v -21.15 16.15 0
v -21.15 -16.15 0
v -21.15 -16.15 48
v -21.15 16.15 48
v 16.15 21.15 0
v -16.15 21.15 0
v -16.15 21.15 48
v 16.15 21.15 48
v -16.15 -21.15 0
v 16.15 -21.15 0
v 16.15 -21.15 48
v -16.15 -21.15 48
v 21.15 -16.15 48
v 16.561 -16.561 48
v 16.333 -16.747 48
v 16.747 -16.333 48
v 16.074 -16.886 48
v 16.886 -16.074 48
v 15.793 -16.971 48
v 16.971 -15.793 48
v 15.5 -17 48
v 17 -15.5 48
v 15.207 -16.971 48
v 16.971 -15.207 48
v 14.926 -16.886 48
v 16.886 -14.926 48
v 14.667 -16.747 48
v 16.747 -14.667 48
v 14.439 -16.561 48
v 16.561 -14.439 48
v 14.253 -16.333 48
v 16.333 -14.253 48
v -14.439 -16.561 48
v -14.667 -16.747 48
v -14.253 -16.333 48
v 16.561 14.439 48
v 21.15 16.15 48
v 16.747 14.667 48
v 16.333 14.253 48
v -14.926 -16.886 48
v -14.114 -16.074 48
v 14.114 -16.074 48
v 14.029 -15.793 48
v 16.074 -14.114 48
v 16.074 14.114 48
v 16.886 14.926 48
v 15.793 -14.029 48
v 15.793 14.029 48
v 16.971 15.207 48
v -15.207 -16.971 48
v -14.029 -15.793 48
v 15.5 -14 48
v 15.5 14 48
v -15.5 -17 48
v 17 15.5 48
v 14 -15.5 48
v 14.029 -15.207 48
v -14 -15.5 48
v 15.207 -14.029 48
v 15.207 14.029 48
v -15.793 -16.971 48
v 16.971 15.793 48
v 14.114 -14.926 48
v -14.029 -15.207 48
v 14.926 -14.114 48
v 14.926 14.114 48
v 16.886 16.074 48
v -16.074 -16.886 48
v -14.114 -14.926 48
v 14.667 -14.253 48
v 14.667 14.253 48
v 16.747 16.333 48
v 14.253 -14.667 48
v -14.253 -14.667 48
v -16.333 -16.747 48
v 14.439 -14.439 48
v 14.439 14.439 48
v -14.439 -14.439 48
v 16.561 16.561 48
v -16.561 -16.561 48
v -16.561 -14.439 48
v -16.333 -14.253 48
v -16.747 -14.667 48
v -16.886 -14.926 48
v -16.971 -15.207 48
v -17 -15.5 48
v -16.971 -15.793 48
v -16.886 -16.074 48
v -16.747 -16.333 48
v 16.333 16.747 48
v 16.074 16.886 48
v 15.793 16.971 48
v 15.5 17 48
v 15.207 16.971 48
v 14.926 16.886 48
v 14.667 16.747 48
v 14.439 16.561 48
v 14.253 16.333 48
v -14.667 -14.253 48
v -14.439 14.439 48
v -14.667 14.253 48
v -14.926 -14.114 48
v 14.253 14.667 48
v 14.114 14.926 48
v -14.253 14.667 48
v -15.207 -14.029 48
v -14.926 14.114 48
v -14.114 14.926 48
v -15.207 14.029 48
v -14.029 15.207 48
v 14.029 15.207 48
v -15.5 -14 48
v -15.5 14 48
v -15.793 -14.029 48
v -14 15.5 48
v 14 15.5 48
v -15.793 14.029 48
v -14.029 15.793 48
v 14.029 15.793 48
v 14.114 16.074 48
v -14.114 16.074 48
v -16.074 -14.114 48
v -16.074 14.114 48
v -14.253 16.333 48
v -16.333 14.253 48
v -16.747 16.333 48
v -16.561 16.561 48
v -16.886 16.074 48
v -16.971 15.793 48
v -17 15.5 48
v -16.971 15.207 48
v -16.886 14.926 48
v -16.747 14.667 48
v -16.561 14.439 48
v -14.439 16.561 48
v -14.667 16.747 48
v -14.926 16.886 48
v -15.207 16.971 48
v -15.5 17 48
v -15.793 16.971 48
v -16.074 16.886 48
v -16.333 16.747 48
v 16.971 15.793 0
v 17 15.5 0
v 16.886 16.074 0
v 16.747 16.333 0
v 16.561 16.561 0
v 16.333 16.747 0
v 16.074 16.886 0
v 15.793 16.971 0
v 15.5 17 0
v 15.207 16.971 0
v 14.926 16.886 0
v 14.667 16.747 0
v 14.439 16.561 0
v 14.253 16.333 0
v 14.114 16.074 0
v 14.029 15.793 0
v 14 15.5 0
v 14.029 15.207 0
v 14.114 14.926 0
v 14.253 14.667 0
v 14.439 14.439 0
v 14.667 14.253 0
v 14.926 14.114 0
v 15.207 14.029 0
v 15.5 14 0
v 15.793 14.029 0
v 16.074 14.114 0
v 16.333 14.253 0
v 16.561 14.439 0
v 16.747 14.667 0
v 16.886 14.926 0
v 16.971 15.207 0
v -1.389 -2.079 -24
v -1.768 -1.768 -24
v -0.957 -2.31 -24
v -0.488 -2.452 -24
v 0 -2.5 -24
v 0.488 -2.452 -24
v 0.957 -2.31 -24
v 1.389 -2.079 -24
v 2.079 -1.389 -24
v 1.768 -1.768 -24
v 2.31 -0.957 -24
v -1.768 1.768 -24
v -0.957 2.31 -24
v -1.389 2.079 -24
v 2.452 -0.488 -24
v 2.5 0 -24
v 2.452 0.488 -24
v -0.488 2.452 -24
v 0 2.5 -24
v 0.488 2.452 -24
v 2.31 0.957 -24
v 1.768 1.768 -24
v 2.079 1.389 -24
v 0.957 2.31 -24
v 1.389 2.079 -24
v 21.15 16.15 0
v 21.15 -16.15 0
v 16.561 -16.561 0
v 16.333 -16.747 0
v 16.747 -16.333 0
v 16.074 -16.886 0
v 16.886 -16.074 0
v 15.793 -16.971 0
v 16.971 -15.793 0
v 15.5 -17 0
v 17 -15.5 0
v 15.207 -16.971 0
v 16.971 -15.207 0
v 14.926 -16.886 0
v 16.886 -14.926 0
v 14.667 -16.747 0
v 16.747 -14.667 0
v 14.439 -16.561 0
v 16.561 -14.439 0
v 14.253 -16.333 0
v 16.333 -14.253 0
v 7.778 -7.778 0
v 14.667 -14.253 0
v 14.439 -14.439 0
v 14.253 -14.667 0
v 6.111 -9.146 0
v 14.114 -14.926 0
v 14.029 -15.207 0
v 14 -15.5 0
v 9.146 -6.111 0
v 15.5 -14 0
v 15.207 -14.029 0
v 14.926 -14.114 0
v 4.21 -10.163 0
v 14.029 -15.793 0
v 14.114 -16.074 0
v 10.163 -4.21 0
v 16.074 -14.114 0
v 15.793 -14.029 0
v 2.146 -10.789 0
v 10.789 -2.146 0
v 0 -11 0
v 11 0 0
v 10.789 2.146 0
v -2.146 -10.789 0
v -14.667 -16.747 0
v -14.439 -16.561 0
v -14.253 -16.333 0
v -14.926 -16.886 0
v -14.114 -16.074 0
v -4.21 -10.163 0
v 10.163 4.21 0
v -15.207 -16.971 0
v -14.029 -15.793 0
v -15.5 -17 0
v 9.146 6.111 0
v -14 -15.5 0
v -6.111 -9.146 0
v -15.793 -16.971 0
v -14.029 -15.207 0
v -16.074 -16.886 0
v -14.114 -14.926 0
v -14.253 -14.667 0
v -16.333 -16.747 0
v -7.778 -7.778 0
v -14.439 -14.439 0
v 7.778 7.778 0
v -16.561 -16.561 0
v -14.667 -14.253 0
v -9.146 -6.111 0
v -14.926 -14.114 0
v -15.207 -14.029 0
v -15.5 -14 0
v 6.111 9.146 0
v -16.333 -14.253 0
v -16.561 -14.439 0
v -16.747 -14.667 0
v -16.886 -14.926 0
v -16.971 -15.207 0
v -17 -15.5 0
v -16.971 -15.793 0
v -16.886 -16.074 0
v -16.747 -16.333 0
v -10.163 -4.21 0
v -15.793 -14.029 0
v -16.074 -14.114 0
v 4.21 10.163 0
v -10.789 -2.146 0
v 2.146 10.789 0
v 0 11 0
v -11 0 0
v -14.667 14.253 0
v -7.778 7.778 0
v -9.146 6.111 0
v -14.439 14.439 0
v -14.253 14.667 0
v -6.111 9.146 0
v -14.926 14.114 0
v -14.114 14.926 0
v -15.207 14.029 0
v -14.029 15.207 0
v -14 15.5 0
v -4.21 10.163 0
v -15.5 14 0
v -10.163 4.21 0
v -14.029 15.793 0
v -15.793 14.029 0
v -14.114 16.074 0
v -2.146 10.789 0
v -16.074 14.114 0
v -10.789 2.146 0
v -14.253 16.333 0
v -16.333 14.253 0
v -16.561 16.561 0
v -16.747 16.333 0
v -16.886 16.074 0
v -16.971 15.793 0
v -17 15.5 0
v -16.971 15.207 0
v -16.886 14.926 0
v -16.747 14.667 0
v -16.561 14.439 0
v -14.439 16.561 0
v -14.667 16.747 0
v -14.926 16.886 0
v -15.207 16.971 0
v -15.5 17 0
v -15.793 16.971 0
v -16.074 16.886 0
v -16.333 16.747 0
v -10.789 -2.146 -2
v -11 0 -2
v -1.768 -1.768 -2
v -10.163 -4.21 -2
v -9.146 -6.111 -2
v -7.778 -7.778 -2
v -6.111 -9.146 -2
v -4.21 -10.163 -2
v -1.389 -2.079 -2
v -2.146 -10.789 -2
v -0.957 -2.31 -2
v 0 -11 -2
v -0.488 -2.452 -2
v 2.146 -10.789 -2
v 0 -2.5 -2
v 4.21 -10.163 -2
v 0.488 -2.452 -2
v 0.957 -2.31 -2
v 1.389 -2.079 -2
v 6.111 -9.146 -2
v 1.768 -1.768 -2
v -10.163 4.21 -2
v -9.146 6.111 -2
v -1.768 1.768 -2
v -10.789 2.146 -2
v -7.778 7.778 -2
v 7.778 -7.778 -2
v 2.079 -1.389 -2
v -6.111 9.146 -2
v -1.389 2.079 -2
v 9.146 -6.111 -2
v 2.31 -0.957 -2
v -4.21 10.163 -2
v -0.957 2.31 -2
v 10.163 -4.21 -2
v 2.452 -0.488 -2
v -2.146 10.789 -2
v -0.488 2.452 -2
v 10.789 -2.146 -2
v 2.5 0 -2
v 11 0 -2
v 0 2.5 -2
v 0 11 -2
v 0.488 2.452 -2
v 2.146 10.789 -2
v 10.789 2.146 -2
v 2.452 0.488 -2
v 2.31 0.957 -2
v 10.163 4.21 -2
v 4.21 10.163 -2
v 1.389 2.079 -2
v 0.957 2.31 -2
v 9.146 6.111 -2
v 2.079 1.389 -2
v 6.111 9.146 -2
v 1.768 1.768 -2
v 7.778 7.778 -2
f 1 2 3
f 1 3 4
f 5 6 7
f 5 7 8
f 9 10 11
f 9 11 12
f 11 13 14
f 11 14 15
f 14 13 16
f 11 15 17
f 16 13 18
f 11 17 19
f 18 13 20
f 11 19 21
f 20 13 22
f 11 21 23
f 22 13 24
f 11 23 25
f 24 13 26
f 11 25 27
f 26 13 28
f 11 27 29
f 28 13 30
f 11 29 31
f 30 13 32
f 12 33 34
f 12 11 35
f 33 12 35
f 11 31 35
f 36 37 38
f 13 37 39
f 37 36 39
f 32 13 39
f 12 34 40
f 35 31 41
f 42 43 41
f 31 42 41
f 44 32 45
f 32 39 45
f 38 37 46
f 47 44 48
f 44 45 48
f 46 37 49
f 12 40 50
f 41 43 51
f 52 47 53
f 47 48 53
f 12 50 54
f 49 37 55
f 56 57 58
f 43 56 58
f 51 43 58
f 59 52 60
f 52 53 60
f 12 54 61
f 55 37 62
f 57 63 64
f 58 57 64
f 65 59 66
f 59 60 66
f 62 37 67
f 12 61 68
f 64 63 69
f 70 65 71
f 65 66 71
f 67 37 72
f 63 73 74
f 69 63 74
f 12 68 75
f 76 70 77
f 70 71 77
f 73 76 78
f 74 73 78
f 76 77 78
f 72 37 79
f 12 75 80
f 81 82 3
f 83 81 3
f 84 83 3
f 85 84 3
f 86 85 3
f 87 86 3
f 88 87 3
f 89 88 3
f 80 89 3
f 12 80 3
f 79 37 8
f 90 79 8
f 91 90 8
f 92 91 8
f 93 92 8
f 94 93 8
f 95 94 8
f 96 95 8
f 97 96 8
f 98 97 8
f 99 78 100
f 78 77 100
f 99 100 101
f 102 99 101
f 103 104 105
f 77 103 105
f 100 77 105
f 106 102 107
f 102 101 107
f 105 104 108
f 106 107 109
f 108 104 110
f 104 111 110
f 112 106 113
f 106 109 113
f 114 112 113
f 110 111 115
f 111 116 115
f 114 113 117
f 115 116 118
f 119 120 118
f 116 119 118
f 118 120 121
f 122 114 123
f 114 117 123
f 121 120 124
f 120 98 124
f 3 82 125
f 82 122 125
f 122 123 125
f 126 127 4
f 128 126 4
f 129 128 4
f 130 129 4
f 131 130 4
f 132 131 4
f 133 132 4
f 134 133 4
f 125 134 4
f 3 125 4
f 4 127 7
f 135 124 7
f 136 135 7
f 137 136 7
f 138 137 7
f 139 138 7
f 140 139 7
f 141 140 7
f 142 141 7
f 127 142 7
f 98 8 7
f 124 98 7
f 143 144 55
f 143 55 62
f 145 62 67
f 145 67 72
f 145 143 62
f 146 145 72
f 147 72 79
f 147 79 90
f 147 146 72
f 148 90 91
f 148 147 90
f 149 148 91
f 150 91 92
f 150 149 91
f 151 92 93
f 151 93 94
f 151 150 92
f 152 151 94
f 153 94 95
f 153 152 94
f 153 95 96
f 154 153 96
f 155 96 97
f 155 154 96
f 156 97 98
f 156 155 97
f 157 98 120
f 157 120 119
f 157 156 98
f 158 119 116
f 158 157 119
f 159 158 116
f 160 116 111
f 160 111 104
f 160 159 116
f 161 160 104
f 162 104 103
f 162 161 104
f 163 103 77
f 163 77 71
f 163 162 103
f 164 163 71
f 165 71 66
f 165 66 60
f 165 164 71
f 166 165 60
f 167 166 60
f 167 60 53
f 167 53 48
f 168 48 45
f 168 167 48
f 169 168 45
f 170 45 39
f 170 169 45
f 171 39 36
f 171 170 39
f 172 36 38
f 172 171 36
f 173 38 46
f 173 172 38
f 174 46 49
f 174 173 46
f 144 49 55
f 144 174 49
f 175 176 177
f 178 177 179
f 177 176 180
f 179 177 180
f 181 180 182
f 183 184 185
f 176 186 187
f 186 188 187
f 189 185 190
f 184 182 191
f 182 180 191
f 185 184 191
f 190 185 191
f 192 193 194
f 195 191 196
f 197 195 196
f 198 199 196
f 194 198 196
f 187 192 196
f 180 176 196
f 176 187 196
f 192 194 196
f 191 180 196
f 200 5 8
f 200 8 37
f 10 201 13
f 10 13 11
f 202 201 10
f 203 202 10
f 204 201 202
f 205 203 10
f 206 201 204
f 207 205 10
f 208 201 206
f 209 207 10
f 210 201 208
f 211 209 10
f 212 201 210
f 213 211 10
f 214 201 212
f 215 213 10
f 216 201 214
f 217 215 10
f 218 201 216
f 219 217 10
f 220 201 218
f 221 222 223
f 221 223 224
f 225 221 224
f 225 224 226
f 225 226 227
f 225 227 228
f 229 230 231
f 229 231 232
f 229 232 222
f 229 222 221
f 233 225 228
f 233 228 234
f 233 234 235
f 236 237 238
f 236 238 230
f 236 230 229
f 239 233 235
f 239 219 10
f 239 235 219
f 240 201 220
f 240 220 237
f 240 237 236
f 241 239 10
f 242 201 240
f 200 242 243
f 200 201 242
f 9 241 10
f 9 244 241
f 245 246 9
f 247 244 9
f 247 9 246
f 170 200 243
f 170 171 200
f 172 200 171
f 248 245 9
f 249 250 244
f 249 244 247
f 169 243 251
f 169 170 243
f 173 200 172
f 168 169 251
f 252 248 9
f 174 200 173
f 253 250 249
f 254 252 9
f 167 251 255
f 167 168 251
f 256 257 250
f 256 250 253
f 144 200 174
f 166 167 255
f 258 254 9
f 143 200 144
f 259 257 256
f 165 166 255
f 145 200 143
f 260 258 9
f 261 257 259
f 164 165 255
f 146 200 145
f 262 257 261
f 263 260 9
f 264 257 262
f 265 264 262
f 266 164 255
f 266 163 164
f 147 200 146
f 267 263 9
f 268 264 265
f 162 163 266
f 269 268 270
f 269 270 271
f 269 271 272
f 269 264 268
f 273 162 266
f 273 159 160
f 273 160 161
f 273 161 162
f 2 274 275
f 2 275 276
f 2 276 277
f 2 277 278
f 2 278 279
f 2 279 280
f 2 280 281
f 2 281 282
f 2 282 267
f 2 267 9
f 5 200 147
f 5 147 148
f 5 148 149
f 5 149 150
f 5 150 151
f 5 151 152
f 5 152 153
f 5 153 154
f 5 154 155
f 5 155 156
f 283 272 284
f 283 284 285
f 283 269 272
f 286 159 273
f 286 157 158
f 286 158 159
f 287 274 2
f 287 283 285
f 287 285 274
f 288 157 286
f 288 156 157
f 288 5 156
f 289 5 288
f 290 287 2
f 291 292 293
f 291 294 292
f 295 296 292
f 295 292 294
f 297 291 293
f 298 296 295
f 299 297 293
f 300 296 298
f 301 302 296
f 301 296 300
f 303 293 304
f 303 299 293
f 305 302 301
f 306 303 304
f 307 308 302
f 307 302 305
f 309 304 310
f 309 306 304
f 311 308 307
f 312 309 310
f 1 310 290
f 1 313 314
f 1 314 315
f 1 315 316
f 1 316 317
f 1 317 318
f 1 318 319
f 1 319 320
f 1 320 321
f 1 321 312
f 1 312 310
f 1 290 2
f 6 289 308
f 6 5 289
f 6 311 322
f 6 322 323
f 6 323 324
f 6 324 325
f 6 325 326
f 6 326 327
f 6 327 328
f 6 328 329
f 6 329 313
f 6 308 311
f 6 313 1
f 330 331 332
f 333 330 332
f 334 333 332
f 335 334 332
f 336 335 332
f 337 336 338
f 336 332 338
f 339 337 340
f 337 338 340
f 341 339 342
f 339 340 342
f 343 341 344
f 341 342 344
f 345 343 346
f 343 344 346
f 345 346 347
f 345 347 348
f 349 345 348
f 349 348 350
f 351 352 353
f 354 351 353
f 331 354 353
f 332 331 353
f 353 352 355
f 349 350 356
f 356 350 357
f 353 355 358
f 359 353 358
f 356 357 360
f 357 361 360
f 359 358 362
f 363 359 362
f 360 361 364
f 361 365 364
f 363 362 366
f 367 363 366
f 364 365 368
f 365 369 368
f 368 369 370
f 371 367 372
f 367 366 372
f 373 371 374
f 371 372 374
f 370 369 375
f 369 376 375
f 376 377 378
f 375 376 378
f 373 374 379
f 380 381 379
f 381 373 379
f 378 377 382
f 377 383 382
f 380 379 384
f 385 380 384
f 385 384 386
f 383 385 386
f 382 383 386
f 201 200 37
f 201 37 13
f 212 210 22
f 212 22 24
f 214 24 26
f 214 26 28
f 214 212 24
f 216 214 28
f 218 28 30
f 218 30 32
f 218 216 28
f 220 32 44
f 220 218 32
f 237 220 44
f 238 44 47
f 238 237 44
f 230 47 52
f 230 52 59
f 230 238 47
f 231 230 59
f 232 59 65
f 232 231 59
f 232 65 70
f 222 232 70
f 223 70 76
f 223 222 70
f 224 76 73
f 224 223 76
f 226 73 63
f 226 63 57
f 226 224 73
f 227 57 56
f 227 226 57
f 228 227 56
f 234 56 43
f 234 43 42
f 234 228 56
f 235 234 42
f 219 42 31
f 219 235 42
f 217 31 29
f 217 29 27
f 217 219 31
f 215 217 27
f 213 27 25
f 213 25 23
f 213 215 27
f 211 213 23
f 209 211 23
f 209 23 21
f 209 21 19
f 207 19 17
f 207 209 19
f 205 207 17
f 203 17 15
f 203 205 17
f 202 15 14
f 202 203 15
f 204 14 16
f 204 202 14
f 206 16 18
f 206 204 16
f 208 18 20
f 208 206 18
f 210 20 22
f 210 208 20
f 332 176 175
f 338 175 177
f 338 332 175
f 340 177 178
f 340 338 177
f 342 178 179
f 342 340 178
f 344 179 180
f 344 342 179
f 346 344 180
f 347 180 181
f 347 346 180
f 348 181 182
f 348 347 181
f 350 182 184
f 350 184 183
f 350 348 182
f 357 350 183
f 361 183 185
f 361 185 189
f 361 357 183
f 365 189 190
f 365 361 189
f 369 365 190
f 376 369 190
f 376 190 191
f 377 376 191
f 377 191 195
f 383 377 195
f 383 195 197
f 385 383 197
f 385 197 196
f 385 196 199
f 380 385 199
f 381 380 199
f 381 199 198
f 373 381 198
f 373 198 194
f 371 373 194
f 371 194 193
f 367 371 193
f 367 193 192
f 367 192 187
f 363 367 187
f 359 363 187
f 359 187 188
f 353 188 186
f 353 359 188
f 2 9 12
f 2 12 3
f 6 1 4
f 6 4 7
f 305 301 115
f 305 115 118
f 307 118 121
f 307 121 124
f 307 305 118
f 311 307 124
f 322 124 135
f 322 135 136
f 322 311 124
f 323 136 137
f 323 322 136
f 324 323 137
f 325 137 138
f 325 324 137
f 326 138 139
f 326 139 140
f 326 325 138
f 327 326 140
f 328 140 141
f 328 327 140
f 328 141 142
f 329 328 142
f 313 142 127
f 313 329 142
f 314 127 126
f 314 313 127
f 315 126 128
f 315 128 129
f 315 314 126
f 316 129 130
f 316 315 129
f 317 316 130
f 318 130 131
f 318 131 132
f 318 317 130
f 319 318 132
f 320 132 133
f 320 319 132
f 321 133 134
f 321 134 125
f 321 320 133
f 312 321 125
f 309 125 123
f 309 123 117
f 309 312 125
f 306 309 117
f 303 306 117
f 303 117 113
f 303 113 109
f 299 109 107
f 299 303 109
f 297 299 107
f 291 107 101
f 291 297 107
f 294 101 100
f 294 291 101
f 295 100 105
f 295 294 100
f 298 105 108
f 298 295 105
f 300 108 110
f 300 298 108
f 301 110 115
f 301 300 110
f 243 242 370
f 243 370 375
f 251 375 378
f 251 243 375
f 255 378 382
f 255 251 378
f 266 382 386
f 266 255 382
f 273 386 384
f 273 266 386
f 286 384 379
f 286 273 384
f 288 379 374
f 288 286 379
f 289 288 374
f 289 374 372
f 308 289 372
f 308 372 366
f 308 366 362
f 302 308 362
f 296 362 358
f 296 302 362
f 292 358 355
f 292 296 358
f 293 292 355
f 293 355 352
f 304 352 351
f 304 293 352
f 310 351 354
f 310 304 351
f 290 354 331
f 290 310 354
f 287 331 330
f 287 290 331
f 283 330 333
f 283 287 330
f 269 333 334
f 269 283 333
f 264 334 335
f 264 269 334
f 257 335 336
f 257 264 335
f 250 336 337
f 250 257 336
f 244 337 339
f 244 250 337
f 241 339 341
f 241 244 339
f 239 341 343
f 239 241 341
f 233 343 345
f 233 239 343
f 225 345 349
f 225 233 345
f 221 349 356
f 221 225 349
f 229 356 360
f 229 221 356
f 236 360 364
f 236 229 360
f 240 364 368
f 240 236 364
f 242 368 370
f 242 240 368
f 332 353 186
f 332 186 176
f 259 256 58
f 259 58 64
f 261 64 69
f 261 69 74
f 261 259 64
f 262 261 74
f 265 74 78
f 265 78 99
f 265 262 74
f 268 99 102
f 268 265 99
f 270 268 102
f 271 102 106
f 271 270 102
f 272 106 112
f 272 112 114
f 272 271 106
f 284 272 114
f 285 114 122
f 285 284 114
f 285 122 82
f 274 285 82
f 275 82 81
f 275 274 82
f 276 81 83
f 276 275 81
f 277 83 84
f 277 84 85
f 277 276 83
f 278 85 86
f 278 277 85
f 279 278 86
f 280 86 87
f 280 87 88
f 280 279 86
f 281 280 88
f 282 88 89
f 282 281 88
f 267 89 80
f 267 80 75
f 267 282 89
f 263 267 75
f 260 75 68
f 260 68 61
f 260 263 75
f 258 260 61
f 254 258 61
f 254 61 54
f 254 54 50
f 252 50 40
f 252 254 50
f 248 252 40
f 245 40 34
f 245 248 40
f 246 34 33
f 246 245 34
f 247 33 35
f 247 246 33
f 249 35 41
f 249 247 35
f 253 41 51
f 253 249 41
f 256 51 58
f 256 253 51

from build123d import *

# Parameters (mm, degrees)
SKETCH1_R           = 1.5
BOSS_EXTRUDE1_DEPTH = 48
SKETCH1_5_R         = 11
BOSS_EXTRUDE2_DEPTH = 2
BOSS_EXTRUDE3_DEPTH = 24


with BuildPart() as part:
    # Sketch1 → Boss-Extrude1 (new body)
    with BuildSketch(Plane.XY):
        Polygon((-21.15, 16.15), (-16.15, 21.15), (16.15, 21.15), (21.15, 16.15), (21.15, -16.15), (16.15, -21.15), (-16.15, -21.15), (-21.15, -16.15), align=None)
        with Locations((-15.5, 15.5)):
            Circle(SKETCH1_R, mode=Mode.SUBTRACT)
        with Locations((-15.5, -15.5)):
            Circle(SKETCH1_R, mode=Mode.SUBTRACT)
        with Locations((15.5, -15.5)):
            Circle(SKETCH1_R, mode=Mode.SUBTRACT)
        with Locations((15.5, 15.5)):
            Circle(SKETCH1_R, mode=Mode.SUBTRACT)
    extrude(amount=BOSS_EXTRUDE1_DEPTH)

    # Sketch1<5> → Boss-Extrude2 (add)
    with BuildSketch(Plane.XY):
        Circle(SKETCH1_5_R)
    extrude(amount=-BOSS_EXTRUDE2_DEPTH)

    # Sketch1<6> → Boss-Extrude3 (add)
    with BuildSketch(Plane.XY):
        with BuildLine():
            Line((-1.767766953, 1.767766953), (-1.767766953, -1.767766953))
            ThreePointArc((-1.767766953, -1.767766953), (2.5, 0), (-1.767766953, 1.767766953))
        make_face()
    extrude(amount=-BOSS_EXTRUDE3_DEPTH)


solid = part.part
